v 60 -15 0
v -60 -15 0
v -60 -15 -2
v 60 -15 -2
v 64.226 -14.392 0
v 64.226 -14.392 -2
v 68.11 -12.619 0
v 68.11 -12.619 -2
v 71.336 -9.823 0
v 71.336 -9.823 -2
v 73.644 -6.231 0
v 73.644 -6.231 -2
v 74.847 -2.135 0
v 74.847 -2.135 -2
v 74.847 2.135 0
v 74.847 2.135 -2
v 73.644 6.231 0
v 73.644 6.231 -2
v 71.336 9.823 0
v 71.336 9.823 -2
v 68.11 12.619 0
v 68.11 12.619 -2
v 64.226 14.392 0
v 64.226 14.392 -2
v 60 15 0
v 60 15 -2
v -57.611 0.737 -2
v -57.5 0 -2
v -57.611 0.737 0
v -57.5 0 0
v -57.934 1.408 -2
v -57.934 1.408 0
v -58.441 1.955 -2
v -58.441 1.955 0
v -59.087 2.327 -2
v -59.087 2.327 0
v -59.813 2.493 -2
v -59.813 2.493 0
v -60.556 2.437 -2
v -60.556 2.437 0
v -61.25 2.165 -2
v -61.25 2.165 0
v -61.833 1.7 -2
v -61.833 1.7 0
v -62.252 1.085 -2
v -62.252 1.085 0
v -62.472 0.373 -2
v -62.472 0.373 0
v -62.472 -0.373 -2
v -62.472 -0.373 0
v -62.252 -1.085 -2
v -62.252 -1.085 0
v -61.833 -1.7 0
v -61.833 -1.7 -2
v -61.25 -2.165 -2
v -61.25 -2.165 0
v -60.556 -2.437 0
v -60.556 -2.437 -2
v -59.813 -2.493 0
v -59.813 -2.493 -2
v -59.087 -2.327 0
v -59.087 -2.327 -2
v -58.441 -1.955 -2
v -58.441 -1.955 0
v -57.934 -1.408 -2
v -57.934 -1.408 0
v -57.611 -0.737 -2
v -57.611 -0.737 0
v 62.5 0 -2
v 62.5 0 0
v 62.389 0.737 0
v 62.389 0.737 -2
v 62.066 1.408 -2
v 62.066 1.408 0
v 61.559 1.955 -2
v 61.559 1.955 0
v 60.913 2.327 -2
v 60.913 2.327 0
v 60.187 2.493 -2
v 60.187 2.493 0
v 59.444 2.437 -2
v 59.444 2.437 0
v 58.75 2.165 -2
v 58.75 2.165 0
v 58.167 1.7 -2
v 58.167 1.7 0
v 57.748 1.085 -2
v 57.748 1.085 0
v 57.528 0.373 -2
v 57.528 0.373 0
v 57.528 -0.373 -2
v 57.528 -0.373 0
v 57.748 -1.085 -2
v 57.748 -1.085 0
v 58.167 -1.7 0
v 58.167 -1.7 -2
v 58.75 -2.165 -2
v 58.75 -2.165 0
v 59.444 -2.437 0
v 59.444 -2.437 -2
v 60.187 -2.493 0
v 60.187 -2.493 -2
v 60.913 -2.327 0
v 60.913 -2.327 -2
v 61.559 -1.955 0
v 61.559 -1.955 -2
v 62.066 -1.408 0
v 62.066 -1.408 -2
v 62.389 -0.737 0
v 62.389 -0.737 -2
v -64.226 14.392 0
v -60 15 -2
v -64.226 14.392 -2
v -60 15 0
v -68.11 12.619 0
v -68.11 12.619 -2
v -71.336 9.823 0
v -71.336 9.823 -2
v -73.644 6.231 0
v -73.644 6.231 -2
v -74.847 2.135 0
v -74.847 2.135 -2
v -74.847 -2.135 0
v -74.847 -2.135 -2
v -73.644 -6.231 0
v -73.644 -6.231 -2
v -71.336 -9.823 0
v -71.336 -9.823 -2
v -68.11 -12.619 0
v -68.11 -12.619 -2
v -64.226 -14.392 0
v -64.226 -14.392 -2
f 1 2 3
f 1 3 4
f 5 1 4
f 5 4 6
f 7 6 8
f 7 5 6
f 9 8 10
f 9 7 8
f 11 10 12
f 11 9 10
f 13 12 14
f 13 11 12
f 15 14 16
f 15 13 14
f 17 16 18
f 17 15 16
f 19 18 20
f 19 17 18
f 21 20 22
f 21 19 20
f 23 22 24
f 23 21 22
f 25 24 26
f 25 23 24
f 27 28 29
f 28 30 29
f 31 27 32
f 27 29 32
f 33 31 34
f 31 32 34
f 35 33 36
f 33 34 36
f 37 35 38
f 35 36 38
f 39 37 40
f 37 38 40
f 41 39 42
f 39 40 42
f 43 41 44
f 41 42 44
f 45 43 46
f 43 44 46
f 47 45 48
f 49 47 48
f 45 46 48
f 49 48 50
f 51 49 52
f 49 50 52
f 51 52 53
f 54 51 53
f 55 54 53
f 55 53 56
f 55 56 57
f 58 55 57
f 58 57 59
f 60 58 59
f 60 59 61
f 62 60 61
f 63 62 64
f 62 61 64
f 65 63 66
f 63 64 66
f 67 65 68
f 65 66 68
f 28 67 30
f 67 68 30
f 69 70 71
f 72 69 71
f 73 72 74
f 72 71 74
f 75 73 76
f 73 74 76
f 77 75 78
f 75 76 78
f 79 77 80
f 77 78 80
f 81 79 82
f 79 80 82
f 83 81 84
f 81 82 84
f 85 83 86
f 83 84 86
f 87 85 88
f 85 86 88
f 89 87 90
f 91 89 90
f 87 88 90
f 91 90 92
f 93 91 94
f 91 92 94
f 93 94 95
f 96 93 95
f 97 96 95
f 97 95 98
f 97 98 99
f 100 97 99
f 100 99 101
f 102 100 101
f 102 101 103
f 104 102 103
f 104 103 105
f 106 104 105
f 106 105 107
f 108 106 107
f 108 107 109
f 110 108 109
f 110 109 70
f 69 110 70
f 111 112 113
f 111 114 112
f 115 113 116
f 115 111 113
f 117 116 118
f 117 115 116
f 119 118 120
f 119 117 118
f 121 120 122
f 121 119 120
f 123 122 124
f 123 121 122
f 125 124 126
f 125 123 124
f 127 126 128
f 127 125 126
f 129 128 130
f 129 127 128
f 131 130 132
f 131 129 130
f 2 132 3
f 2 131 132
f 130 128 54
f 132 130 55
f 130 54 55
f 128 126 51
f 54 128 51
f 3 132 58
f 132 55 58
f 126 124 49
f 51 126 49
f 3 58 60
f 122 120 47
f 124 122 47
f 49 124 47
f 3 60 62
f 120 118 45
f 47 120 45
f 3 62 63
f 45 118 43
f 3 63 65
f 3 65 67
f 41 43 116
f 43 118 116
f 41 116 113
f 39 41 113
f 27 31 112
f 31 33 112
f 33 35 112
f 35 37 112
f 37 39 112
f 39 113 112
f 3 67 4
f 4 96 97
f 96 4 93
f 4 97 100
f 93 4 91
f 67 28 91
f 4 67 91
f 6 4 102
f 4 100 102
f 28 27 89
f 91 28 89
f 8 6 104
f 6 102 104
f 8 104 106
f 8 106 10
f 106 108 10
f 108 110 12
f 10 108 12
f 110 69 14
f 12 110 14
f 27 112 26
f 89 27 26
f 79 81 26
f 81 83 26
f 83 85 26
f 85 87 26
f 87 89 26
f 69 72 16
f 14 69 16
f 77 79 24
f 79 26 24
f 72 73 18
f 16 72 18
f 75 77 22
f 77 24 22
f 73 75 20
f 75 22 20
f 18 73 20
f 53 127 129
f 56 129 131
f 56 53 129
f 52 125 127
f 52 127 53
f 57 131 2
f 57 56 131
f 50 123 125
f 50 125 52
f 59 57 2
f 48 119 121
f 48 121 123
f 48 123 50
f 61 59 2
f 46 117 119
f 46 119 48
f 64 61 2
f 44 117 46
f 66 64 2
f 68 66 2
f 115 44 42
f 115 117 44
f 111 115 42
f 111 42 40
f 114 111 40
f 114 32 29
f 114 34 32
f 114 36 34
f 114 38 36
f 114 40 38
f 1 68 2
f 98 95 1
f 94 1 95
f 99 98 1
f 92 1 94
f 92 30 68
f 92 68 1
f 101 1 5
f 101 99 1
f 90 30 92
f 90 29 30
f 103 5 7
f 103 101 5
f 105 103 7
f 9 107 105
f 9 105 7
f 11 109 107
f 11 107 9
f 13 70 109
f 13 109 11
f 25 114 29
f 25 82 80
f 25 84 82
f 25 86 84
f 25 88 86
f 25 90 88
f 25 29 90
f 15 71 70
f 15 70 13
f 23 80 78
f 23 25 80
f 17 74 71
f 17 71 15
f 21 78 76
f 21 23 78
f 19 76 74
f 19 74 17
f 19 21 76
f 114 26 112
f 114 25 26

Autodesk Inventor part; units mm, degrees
ref_plane "YZ Plane" through (0, 0, 0) normal (1, 0, 0) x (0, 1, 0)
ref_plane "XZ Plane" through (0, 0, 0) normal (0, 1, 0) x (-1, 0, 0)
ref_plane "XY Plane" through (0, 0, 0) normal (0, 0, 1) x (1, 0, 0)
sketch "Sketch1" plane through (0, 0, 0) normal (0, 0, 1) x (1, 0, 0)
  line L0 (-60, 0) -> (60, 0) construction
  line L1 (-60, -15) -> (60, -15)
  line L2 (60, 15) -> (-60, 15)
  arc A0 (-60, 15) -> (-60, -15) centre (-60, 0) ccw
  arc A1 (60, -15) -> (60, 15) centre (60, 0) ccw
  circle A2 centre (-60, 0) radius 2.5
  circle A3 centre (60, 0) radius 2.5
  line L3 (0, 15) -> (0, -15) construction
  point P0 (0, 0)
  point P1 (0, 0)
  point P2 (0, 0)
  point P3 (0, 0)
  dimension "d37" = 120
  dimension "d38" = 15
  dimension "d39" = 120
  dimension "d40" = 5
extrude "Plate1" add sketch "Sketch1" against normal blind 2
equation "\"d15\" = Thickness"
equation "\"BendRadius\" = Thickness"
equation "\"BendReliefWidth\" = Thickness"
equation "\"BendReliefDepth\" = 0.5 * Thickness"
equation "\"CornerReliefSize\" = 4 * Thickness"
equation "\"MinimumRemnant\" = 2 * Thickness"
equation "\"TransitionRadius\" = BendRadius"
equation "\"JacobiRadiusSize\" = BendRadius"
equation "\"GapSize\" = Thickness"
equation "\"Thickness\" = 2"
properties part number "ДМФ 01 15 Барабан усилитель борта"
